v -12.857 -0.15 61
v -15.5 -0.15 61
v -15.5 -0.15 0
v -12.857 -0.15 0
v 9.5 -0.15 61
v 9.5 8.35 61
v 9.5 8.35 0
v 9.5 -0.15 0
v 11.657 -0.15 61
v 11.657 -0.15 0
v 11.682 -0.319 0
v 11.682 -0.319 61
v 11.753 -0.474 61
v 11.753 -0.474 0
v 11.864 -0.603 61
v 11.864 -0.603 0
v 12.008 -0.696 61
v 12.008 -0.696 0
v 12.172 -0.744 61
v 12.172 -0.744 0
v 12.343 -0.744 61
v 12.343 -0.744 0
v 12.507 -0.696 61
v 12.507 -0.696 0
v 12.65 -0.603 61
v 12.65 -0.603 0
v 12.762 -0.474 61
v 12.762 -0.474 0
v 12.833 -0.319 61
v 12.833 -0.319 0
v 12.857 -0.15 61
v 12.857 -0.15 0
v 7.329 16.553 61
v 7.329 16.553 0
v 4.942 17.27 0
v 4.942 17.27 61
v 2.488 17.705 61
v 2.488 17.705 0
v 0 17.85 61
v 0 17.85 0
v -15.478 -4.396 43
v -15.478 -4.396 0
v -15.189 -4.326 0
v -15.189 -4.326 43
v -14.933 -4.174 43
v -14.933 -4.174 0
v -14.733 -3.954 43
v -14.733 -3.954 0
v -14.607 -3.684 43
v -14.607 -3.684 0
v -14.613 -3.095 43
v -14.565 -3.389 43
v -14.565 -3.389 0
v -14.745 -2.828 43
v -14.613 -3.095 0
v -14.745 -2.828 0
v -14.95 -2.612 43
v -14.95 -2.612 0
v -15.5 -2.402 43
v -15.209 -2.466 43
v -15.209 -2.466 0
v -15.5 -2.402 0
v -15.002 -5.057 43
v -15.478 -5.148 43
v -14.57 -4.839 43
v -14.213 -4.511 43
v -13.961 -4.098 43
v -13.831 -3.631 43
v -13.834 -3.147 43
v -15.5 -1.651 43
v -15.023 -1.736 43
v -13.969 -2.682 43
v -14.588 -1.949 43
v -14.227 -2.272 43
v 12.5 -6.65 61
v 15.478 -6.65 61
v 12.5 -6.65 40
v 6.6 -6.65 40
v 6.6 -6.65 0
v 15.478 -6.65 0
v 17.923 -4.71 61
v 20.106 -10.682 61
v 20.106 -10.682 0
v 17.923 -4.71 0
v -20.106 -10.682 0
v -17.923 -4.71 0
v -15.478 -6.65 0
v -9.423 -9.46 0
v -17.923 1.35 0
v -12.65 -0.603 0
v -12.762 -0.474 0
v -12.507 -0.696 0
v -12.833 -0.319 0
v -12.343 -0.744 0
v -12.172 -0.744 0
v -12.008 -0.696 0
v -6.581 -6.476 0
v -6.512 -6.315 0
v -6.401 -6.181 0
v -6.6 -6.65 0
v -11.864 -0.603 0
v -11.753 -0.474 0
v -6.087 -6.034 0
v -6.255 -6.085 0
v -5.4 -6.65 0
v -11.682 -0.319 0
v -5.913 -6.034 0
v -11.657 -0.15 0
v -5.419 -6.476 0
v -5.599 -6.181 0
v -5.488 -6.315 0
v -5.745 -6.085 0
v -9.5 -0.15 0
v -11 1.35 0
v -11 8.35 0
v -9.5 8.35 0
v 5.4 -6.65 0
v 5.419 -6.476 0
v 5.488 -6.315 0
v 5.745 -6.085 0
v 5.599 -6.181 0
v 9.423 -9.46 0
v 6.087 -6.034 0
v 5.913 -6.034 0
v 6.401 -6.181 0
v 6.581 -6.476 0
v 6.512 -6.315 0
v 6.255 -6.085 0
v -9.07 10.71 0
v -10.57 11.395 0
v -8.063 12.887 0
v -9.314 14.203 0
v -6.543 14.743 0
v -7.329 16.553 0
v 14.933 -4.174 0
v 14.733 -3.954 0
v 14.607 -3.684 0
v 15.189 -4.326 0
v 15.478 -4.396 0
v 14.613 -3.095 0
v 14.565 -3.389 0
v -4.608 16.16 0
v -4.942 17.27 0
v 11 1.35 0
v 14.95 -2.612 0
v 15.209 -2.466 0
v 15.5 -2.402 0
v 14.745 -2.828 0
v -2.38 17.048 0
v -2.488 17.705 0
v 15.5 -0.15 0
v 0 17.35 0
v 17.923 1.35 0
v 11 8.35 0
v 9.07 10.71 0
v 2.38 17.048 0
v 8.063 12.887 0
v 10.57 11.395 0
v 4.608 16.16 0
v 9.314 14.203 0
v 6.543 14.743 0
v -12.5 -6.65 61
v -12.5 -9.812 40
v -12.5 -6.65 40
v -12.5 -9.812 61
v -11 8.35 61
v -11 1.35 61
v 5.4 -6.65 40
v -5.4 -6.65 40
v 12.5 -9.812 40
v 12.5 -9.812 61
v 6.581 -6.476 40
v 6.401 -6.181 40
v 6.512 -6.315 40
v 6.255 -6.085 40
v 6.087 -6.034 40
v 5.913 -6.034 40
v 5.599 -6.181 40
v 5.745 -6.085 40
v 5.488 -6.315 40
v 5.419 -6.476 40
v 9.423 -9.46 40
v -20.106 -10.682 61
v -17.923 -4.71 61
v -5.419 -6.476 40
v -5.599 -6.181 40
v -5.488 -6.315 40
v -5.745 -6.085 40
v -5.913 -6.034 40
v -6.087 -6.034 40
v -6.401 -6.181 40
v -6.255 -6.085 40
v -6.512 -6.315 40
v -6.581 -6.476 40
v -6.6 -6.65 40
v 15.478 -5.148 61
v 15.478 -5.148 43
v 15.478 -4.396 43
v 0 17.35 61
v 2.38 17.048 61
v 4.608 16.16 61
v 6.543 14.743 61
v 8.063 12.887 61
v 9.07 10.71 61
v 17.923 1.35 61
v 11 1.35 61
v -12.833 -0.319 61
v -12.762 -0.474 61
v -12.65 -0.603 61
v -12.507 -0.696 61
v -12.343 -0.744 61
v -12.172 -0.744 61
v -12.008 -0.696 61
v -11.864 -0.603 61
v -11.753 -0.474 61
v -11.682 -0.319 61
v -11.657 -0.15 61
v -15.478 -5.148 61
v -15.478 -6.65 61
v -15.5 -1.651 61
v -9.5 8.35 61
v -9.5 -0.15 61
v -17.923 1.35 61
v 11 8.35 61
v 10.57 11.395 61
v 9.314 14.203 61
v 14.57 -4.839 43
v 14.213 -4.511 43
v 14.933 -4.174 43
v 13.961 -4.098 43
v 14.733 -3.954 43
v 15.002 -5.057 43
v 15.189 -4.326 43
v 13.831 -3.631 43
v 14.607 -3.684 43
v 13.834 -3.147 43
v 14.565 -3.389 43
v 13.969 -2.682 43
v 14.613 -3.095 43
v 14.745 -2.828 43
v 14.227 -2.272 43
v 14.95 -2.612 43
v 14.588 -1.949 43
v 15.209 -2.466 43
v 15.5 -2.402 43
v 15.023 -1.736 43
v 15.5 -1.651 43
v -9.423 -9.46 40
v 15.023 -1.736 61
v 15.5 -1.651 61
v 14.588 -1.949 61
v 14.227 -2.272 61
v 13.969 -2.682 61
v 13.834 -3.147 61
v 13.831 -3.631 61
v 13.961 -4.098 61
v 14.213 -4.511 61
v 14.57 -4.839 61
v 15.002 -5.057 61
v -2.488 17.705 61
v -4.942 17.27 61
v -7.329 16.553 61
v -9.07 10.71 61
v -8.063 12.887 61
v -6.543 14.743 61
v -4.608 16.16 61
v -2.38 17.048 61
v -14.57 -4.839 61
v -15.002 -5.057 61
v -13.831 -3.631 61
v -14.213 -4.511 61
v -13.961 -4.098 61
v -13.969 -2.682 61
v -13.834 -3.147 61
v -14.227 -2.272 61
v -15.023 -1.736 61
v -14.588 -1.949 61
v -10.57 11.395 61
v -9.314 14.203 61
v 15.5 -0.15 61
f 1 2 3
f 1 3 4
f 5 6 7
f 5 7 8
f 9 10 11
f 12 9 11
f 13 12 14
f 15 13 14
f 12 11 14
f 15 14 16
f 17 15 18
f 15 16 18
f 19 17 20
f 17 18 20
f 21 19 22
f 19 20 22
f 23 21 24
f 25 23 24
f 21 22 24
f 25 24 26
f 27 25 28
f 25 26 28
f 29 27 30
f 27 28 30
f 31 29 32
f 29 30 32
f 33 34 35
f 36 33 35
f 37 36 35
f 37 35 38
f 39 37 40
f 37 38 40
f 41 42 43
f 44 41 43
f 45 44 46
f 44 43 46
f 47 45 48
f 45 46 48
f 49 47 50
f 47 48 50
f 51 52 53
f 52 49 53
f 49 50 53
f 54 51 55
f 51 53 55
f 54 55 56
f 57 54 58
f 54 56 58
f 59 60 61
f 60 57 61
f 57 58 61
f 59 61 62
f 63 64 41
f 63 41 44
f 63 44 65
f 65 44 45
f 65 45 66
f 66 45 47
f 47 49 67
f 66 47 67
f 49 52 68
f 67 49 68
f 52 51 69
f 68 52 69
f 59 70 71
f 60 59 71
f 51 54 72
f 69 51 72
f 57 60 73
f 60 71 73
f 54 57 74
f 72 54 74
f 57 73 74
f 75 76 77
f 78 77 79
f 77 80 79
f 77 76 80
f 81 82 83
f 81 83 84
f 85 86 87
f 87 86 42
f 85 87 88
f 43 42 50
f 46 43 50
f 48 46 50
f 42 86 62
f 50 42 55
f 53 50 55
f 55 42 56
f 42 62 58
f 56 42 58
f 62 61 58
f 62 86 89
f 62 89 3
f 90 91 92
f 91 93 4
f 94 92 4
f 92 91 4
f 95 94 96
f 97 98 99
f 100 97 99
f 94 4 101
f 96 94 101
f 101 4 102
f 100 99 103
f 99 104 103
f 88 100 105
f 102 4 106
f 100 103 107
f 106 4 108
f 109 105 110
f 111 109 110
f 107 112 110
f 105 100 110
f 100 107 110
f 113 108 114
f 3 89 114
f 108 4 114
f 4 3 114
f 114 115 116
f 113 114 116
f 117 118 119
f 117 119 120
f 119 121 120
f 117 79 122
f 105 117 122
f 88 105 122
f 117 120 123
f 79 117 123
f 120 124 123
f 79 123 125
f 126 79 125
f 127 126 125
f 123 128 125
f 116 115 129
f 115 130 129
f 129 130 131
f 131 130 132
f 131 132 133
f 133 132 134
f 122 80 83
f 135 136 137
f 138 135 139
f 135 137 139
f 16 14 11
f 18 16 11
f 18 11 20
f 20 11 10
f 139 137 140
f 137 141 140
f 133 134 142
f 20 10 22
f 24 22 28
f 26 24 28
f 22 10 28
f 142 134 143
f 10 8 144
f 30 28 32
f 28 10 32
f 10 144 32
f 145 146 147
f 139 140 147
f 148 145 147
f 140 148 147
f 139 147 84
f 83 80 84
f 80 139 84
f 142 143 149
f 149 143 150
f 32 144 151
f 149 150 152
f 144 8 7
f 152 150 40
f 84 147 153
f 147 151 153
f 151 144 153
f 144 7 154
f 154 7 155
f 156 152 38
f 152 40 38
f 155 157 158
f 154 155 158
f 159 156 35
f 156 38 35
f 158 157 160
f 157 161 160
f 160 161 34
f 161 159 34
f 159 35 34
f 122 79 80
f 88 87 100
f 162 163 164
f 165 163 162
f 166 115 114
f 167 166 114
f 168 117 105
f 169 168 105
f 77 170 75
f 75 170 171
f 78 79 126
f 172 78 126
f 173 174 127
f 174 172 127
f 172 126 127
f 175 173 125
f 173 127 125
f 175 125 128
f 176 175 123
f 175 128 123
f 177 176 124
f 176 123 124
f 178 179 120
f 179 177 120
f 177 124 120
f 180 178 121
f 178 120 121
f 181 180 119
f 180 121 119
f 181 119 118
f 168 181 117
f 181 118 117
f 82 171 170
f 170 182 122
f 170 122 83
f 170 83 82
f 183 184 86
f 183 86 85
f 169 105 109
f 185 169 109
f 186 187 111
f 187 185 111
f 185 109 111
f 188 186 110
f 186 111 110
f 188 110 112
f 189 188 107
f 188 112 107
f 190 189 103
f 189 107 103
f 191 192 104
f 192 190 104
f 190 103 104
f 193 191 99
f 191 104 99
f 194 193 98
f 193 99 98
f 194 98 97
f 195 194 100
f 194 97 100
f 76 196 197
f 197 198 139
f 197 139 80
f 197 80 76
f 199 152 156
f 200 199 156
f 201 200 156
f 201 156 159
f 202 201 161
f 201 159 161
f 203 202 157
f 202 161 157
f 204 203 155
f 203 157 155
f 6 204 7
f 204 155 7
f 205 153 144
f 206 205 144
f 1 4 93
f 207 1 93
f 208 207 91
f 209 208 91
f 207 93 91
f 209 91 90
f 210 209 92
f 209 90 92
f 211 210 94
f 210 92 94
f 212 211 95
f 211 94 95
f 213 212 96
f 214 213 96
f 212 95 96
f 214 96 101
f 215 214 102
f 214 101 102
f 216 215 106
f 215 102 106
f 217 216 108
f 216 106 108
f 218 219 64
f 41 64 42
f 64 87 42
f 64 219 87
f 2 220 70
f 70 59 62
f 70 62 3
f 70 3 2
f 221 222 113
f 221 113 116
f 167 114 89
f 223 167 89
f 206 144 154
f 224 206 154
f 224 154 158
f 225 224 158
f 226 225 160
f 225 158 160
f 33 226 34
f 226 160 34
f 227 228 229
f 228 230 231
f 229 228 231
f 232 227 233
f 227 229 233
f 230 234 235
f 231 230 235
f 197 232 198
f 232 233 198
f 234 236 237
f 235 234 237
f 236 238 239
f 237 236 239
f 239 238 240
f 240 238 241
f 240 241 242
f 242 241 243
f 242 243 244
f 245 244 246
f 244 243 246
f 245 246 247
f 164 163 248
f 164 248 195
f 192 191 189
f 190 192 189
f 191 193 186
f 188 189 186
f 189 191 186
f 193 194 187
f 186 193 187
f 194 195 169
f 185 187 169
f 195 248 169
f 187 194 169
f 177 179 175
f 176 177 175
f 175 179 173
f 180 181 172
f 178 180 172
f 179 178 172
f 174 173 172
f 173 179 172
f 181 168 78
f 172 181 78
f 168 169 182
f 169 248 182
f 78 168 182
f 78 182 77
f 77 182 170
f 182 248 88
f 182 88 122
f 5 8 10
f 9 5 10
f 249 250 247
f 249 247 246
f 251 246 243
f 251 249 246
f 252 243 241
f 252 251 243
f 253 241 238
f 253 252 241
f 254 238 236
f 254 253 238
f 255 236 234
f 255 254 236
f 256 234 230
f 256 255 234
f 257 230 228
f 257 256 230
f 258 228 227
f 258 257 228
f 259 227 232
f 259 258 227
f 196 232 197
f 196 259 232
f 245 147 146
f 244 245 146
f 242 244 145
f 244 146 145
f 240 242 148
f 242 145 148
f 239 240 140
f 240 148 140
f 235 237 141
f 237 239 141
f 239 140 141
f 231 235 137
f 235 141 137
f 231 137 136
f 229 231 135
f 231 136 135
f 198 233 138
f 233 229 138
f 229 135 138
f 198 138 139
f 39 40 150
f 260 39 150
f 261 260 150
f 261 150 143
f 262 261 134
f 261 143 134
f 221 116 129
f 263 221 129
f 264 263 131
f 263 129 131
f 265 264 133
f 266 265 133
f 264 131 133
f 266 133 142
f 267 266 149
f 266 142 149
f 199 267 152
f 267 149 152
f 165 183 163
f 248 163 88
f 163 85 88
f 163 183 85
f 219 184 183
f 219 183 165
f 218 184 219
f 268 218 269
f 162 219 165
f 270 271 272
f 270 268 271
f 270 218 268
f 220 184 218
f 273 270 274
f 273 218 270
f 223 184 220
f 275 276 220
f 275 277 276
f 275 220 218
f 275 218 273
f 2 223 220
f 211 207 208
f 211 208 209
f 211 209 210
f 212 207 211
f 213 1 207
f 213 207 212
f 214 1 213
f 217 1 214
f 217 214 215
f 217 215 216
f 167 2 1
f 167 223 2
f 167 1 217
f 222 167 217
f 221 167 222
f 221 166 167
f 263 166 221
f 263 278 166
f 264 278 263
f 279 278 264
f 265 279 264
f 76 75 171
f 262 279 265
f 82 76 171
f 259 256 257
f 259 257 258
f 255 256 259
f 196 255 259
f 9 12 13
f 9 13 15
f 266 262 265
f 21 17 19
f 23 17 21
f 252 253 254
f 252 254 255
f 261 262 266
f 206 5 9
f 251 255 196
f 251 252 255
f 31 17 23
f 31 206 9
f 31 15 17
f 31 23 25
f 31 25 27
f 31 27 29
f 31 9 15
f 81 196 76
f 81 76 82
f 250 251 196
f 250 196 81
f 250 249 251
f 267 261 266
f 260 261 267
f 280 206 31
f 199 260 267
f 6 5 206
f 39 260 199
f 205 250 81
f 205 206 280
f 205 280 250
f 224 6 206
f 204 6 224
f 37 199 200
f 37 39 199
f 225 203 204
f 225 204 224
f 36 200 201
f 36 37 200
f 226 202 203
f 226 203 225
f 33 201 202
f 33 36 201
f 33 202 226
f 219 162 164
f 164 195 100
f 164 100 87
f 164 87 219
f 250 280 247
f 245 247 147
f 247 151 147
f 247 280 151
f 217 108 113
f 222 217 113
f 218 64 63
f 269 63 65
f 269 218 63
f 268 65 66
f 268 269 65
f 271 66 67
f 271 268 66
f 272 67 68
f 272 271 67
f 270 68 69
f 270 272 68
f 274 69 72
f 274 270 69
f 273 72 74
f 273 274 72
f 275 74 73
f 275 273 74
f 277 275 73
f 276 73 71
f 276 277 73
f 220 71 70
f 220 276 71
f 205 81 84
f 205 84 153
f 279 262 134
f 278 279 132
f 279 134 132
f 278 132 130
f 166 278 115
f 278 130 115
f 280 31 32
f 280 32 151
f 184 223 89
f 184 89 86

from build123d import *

# Parameters (mm, degrees)
F1_DEPTH = 61
F2_W     = 25
F2_H     = 21
F3_DEPTH = 4
F4_R     = 1.75
F5_DEPTH = 18


with BuildPart() as f1:
    # F0 (on Top) → F1 (new body)
    with BuildSketch(Plane.XY):
        with BuildLine():
            Line((-9.5, -0.15), (-9.5, 8.35))
            ThreePointArc((-9.5, 8.35), (-6.543126, 14.742744), (0, 17.35))
            Line((0, 17.35), (0, 17.85))
            ThreePointArc((0, 17.85), (-3.721623, 17.523131), (-7.329289, 16.552532))
            ThreePointArc((-7.329289, 16.552532), (-10.040473, 12.843207), (-11, 8.35))
            Line((-11, 8.35), (-11, 1.35))
            Line((-11, 1.35), (-17.922894, 1.35))
            Line((-17.922894, 1.35), (-17.922894, -4.709674))
            Line((-17.922894, -4.709674), (-20.105763, -10.681977))
            Line((-20.105763, -10.681977), (-9.422894, -9.459674))
            Line((-9.422894, -9.459674), (0, -9.459674))
            Line((0, -9.459674), (0, -6.65))
            Line((0, -6.65), (-5.4, -6.65))
            ThreePointArc((-5.4, -6.65), (-6, -6.027996), (-6.6, -6.65))
            Line((-6.6, -6.65), (-15.478196, -6.65))
            Line((-15.478196, -6.65), (-15.478196, -4.39619))
            ThreePointArc((-15.478196, -4.39619), (-14.565471, -3.389066), (-15.5, -2.402142))
            Line((-15.5, -2.402142), (-15.5, -0.15))
            Line((-15.5, -0.15), (-12.85729, -0.15))
            ThreePointArc((-12.85729, -0.15), (-12.25729, -0.75), (-11.65729, -0.15))
            Line((-11.65729, -0.15), (-9.5, -0.15))
        make_face()
        with BuildLine():
            Line((0, 17.85), (0, 17.35))
            ThreePointArc((0, 17.35), (6.543126, 14.742744), (9.5, 8.35))
            Line((9.5, 8.35), (9.5, -0.15))
            Line((9.5, -0.15), (11.65729, -0.15))
            ThreePointArc((11.65729, -0.15), (12.25729, -0.75), (12.85729, -0.15))
            Line((12.85729, -0.15), (15.5, -0.15))
            Line((15.5, -0.15), (15.5, -2.402142))
            ThreePointArc((15.5, -2.402142), (14.565471, -3.389066), (15.478196, -4.39619))
            Line((15.478196, -4.39619), (15.478196, -6.65))
            Line((15.478196, -6.65), (6.6, -6.65))
            ThreePointArc((6.6, -6.65), (6, -6.027996), (5.4, -6.65))
            Line((5.4, -6.65), (0, -6.65))
            Line((0, -6.65), (0, -9.459674))
            Line((0, -9.459674), (9.422894, -9.459674))
            Line((9.422894, -9.459674), (20.105763, -10.681977))
            Line((20.105763, -10.681977), (17.922894, -4.709674))
            Line((17.922894, -4.709674), (17.922894, 1.35))
            Line((17.922894, 1.35), (11, 1.35))
            Line((11, 1.35), (11, 8.35))
            ThreePointArc((11, 8.35), (10.040473, 12.843207), (7.329289, 16.552532))
            ThreePointArc((7.329289, 16.552532), (3.721623, 17.523131), (0, 17.85))
        make_face()
    extrude(amount=F1_DEPTH)

    # F2 (on face) → F3 (cut, symmetric)
    with BuildSketch(Plane.XZ.offset(9.459674)):
        with Locations((0, 50.5)):
            Rectangle(F2_W, F2_H)
    extrude(amount=F3_DEPTH, both=True, mode=Mode.SUBTRACT)

    # F4 (on face) → F5 (join)
    with BuildSketch(Plane.XY.offset(61)):
        with Locations((-15.565411, -3.4)):
            Circle(F4_R)
        with Locations((15.565411, -3.4)):
            Circle(F4_R)
    extrude(amount=-F5_DEPTH)


solid = f1.part
